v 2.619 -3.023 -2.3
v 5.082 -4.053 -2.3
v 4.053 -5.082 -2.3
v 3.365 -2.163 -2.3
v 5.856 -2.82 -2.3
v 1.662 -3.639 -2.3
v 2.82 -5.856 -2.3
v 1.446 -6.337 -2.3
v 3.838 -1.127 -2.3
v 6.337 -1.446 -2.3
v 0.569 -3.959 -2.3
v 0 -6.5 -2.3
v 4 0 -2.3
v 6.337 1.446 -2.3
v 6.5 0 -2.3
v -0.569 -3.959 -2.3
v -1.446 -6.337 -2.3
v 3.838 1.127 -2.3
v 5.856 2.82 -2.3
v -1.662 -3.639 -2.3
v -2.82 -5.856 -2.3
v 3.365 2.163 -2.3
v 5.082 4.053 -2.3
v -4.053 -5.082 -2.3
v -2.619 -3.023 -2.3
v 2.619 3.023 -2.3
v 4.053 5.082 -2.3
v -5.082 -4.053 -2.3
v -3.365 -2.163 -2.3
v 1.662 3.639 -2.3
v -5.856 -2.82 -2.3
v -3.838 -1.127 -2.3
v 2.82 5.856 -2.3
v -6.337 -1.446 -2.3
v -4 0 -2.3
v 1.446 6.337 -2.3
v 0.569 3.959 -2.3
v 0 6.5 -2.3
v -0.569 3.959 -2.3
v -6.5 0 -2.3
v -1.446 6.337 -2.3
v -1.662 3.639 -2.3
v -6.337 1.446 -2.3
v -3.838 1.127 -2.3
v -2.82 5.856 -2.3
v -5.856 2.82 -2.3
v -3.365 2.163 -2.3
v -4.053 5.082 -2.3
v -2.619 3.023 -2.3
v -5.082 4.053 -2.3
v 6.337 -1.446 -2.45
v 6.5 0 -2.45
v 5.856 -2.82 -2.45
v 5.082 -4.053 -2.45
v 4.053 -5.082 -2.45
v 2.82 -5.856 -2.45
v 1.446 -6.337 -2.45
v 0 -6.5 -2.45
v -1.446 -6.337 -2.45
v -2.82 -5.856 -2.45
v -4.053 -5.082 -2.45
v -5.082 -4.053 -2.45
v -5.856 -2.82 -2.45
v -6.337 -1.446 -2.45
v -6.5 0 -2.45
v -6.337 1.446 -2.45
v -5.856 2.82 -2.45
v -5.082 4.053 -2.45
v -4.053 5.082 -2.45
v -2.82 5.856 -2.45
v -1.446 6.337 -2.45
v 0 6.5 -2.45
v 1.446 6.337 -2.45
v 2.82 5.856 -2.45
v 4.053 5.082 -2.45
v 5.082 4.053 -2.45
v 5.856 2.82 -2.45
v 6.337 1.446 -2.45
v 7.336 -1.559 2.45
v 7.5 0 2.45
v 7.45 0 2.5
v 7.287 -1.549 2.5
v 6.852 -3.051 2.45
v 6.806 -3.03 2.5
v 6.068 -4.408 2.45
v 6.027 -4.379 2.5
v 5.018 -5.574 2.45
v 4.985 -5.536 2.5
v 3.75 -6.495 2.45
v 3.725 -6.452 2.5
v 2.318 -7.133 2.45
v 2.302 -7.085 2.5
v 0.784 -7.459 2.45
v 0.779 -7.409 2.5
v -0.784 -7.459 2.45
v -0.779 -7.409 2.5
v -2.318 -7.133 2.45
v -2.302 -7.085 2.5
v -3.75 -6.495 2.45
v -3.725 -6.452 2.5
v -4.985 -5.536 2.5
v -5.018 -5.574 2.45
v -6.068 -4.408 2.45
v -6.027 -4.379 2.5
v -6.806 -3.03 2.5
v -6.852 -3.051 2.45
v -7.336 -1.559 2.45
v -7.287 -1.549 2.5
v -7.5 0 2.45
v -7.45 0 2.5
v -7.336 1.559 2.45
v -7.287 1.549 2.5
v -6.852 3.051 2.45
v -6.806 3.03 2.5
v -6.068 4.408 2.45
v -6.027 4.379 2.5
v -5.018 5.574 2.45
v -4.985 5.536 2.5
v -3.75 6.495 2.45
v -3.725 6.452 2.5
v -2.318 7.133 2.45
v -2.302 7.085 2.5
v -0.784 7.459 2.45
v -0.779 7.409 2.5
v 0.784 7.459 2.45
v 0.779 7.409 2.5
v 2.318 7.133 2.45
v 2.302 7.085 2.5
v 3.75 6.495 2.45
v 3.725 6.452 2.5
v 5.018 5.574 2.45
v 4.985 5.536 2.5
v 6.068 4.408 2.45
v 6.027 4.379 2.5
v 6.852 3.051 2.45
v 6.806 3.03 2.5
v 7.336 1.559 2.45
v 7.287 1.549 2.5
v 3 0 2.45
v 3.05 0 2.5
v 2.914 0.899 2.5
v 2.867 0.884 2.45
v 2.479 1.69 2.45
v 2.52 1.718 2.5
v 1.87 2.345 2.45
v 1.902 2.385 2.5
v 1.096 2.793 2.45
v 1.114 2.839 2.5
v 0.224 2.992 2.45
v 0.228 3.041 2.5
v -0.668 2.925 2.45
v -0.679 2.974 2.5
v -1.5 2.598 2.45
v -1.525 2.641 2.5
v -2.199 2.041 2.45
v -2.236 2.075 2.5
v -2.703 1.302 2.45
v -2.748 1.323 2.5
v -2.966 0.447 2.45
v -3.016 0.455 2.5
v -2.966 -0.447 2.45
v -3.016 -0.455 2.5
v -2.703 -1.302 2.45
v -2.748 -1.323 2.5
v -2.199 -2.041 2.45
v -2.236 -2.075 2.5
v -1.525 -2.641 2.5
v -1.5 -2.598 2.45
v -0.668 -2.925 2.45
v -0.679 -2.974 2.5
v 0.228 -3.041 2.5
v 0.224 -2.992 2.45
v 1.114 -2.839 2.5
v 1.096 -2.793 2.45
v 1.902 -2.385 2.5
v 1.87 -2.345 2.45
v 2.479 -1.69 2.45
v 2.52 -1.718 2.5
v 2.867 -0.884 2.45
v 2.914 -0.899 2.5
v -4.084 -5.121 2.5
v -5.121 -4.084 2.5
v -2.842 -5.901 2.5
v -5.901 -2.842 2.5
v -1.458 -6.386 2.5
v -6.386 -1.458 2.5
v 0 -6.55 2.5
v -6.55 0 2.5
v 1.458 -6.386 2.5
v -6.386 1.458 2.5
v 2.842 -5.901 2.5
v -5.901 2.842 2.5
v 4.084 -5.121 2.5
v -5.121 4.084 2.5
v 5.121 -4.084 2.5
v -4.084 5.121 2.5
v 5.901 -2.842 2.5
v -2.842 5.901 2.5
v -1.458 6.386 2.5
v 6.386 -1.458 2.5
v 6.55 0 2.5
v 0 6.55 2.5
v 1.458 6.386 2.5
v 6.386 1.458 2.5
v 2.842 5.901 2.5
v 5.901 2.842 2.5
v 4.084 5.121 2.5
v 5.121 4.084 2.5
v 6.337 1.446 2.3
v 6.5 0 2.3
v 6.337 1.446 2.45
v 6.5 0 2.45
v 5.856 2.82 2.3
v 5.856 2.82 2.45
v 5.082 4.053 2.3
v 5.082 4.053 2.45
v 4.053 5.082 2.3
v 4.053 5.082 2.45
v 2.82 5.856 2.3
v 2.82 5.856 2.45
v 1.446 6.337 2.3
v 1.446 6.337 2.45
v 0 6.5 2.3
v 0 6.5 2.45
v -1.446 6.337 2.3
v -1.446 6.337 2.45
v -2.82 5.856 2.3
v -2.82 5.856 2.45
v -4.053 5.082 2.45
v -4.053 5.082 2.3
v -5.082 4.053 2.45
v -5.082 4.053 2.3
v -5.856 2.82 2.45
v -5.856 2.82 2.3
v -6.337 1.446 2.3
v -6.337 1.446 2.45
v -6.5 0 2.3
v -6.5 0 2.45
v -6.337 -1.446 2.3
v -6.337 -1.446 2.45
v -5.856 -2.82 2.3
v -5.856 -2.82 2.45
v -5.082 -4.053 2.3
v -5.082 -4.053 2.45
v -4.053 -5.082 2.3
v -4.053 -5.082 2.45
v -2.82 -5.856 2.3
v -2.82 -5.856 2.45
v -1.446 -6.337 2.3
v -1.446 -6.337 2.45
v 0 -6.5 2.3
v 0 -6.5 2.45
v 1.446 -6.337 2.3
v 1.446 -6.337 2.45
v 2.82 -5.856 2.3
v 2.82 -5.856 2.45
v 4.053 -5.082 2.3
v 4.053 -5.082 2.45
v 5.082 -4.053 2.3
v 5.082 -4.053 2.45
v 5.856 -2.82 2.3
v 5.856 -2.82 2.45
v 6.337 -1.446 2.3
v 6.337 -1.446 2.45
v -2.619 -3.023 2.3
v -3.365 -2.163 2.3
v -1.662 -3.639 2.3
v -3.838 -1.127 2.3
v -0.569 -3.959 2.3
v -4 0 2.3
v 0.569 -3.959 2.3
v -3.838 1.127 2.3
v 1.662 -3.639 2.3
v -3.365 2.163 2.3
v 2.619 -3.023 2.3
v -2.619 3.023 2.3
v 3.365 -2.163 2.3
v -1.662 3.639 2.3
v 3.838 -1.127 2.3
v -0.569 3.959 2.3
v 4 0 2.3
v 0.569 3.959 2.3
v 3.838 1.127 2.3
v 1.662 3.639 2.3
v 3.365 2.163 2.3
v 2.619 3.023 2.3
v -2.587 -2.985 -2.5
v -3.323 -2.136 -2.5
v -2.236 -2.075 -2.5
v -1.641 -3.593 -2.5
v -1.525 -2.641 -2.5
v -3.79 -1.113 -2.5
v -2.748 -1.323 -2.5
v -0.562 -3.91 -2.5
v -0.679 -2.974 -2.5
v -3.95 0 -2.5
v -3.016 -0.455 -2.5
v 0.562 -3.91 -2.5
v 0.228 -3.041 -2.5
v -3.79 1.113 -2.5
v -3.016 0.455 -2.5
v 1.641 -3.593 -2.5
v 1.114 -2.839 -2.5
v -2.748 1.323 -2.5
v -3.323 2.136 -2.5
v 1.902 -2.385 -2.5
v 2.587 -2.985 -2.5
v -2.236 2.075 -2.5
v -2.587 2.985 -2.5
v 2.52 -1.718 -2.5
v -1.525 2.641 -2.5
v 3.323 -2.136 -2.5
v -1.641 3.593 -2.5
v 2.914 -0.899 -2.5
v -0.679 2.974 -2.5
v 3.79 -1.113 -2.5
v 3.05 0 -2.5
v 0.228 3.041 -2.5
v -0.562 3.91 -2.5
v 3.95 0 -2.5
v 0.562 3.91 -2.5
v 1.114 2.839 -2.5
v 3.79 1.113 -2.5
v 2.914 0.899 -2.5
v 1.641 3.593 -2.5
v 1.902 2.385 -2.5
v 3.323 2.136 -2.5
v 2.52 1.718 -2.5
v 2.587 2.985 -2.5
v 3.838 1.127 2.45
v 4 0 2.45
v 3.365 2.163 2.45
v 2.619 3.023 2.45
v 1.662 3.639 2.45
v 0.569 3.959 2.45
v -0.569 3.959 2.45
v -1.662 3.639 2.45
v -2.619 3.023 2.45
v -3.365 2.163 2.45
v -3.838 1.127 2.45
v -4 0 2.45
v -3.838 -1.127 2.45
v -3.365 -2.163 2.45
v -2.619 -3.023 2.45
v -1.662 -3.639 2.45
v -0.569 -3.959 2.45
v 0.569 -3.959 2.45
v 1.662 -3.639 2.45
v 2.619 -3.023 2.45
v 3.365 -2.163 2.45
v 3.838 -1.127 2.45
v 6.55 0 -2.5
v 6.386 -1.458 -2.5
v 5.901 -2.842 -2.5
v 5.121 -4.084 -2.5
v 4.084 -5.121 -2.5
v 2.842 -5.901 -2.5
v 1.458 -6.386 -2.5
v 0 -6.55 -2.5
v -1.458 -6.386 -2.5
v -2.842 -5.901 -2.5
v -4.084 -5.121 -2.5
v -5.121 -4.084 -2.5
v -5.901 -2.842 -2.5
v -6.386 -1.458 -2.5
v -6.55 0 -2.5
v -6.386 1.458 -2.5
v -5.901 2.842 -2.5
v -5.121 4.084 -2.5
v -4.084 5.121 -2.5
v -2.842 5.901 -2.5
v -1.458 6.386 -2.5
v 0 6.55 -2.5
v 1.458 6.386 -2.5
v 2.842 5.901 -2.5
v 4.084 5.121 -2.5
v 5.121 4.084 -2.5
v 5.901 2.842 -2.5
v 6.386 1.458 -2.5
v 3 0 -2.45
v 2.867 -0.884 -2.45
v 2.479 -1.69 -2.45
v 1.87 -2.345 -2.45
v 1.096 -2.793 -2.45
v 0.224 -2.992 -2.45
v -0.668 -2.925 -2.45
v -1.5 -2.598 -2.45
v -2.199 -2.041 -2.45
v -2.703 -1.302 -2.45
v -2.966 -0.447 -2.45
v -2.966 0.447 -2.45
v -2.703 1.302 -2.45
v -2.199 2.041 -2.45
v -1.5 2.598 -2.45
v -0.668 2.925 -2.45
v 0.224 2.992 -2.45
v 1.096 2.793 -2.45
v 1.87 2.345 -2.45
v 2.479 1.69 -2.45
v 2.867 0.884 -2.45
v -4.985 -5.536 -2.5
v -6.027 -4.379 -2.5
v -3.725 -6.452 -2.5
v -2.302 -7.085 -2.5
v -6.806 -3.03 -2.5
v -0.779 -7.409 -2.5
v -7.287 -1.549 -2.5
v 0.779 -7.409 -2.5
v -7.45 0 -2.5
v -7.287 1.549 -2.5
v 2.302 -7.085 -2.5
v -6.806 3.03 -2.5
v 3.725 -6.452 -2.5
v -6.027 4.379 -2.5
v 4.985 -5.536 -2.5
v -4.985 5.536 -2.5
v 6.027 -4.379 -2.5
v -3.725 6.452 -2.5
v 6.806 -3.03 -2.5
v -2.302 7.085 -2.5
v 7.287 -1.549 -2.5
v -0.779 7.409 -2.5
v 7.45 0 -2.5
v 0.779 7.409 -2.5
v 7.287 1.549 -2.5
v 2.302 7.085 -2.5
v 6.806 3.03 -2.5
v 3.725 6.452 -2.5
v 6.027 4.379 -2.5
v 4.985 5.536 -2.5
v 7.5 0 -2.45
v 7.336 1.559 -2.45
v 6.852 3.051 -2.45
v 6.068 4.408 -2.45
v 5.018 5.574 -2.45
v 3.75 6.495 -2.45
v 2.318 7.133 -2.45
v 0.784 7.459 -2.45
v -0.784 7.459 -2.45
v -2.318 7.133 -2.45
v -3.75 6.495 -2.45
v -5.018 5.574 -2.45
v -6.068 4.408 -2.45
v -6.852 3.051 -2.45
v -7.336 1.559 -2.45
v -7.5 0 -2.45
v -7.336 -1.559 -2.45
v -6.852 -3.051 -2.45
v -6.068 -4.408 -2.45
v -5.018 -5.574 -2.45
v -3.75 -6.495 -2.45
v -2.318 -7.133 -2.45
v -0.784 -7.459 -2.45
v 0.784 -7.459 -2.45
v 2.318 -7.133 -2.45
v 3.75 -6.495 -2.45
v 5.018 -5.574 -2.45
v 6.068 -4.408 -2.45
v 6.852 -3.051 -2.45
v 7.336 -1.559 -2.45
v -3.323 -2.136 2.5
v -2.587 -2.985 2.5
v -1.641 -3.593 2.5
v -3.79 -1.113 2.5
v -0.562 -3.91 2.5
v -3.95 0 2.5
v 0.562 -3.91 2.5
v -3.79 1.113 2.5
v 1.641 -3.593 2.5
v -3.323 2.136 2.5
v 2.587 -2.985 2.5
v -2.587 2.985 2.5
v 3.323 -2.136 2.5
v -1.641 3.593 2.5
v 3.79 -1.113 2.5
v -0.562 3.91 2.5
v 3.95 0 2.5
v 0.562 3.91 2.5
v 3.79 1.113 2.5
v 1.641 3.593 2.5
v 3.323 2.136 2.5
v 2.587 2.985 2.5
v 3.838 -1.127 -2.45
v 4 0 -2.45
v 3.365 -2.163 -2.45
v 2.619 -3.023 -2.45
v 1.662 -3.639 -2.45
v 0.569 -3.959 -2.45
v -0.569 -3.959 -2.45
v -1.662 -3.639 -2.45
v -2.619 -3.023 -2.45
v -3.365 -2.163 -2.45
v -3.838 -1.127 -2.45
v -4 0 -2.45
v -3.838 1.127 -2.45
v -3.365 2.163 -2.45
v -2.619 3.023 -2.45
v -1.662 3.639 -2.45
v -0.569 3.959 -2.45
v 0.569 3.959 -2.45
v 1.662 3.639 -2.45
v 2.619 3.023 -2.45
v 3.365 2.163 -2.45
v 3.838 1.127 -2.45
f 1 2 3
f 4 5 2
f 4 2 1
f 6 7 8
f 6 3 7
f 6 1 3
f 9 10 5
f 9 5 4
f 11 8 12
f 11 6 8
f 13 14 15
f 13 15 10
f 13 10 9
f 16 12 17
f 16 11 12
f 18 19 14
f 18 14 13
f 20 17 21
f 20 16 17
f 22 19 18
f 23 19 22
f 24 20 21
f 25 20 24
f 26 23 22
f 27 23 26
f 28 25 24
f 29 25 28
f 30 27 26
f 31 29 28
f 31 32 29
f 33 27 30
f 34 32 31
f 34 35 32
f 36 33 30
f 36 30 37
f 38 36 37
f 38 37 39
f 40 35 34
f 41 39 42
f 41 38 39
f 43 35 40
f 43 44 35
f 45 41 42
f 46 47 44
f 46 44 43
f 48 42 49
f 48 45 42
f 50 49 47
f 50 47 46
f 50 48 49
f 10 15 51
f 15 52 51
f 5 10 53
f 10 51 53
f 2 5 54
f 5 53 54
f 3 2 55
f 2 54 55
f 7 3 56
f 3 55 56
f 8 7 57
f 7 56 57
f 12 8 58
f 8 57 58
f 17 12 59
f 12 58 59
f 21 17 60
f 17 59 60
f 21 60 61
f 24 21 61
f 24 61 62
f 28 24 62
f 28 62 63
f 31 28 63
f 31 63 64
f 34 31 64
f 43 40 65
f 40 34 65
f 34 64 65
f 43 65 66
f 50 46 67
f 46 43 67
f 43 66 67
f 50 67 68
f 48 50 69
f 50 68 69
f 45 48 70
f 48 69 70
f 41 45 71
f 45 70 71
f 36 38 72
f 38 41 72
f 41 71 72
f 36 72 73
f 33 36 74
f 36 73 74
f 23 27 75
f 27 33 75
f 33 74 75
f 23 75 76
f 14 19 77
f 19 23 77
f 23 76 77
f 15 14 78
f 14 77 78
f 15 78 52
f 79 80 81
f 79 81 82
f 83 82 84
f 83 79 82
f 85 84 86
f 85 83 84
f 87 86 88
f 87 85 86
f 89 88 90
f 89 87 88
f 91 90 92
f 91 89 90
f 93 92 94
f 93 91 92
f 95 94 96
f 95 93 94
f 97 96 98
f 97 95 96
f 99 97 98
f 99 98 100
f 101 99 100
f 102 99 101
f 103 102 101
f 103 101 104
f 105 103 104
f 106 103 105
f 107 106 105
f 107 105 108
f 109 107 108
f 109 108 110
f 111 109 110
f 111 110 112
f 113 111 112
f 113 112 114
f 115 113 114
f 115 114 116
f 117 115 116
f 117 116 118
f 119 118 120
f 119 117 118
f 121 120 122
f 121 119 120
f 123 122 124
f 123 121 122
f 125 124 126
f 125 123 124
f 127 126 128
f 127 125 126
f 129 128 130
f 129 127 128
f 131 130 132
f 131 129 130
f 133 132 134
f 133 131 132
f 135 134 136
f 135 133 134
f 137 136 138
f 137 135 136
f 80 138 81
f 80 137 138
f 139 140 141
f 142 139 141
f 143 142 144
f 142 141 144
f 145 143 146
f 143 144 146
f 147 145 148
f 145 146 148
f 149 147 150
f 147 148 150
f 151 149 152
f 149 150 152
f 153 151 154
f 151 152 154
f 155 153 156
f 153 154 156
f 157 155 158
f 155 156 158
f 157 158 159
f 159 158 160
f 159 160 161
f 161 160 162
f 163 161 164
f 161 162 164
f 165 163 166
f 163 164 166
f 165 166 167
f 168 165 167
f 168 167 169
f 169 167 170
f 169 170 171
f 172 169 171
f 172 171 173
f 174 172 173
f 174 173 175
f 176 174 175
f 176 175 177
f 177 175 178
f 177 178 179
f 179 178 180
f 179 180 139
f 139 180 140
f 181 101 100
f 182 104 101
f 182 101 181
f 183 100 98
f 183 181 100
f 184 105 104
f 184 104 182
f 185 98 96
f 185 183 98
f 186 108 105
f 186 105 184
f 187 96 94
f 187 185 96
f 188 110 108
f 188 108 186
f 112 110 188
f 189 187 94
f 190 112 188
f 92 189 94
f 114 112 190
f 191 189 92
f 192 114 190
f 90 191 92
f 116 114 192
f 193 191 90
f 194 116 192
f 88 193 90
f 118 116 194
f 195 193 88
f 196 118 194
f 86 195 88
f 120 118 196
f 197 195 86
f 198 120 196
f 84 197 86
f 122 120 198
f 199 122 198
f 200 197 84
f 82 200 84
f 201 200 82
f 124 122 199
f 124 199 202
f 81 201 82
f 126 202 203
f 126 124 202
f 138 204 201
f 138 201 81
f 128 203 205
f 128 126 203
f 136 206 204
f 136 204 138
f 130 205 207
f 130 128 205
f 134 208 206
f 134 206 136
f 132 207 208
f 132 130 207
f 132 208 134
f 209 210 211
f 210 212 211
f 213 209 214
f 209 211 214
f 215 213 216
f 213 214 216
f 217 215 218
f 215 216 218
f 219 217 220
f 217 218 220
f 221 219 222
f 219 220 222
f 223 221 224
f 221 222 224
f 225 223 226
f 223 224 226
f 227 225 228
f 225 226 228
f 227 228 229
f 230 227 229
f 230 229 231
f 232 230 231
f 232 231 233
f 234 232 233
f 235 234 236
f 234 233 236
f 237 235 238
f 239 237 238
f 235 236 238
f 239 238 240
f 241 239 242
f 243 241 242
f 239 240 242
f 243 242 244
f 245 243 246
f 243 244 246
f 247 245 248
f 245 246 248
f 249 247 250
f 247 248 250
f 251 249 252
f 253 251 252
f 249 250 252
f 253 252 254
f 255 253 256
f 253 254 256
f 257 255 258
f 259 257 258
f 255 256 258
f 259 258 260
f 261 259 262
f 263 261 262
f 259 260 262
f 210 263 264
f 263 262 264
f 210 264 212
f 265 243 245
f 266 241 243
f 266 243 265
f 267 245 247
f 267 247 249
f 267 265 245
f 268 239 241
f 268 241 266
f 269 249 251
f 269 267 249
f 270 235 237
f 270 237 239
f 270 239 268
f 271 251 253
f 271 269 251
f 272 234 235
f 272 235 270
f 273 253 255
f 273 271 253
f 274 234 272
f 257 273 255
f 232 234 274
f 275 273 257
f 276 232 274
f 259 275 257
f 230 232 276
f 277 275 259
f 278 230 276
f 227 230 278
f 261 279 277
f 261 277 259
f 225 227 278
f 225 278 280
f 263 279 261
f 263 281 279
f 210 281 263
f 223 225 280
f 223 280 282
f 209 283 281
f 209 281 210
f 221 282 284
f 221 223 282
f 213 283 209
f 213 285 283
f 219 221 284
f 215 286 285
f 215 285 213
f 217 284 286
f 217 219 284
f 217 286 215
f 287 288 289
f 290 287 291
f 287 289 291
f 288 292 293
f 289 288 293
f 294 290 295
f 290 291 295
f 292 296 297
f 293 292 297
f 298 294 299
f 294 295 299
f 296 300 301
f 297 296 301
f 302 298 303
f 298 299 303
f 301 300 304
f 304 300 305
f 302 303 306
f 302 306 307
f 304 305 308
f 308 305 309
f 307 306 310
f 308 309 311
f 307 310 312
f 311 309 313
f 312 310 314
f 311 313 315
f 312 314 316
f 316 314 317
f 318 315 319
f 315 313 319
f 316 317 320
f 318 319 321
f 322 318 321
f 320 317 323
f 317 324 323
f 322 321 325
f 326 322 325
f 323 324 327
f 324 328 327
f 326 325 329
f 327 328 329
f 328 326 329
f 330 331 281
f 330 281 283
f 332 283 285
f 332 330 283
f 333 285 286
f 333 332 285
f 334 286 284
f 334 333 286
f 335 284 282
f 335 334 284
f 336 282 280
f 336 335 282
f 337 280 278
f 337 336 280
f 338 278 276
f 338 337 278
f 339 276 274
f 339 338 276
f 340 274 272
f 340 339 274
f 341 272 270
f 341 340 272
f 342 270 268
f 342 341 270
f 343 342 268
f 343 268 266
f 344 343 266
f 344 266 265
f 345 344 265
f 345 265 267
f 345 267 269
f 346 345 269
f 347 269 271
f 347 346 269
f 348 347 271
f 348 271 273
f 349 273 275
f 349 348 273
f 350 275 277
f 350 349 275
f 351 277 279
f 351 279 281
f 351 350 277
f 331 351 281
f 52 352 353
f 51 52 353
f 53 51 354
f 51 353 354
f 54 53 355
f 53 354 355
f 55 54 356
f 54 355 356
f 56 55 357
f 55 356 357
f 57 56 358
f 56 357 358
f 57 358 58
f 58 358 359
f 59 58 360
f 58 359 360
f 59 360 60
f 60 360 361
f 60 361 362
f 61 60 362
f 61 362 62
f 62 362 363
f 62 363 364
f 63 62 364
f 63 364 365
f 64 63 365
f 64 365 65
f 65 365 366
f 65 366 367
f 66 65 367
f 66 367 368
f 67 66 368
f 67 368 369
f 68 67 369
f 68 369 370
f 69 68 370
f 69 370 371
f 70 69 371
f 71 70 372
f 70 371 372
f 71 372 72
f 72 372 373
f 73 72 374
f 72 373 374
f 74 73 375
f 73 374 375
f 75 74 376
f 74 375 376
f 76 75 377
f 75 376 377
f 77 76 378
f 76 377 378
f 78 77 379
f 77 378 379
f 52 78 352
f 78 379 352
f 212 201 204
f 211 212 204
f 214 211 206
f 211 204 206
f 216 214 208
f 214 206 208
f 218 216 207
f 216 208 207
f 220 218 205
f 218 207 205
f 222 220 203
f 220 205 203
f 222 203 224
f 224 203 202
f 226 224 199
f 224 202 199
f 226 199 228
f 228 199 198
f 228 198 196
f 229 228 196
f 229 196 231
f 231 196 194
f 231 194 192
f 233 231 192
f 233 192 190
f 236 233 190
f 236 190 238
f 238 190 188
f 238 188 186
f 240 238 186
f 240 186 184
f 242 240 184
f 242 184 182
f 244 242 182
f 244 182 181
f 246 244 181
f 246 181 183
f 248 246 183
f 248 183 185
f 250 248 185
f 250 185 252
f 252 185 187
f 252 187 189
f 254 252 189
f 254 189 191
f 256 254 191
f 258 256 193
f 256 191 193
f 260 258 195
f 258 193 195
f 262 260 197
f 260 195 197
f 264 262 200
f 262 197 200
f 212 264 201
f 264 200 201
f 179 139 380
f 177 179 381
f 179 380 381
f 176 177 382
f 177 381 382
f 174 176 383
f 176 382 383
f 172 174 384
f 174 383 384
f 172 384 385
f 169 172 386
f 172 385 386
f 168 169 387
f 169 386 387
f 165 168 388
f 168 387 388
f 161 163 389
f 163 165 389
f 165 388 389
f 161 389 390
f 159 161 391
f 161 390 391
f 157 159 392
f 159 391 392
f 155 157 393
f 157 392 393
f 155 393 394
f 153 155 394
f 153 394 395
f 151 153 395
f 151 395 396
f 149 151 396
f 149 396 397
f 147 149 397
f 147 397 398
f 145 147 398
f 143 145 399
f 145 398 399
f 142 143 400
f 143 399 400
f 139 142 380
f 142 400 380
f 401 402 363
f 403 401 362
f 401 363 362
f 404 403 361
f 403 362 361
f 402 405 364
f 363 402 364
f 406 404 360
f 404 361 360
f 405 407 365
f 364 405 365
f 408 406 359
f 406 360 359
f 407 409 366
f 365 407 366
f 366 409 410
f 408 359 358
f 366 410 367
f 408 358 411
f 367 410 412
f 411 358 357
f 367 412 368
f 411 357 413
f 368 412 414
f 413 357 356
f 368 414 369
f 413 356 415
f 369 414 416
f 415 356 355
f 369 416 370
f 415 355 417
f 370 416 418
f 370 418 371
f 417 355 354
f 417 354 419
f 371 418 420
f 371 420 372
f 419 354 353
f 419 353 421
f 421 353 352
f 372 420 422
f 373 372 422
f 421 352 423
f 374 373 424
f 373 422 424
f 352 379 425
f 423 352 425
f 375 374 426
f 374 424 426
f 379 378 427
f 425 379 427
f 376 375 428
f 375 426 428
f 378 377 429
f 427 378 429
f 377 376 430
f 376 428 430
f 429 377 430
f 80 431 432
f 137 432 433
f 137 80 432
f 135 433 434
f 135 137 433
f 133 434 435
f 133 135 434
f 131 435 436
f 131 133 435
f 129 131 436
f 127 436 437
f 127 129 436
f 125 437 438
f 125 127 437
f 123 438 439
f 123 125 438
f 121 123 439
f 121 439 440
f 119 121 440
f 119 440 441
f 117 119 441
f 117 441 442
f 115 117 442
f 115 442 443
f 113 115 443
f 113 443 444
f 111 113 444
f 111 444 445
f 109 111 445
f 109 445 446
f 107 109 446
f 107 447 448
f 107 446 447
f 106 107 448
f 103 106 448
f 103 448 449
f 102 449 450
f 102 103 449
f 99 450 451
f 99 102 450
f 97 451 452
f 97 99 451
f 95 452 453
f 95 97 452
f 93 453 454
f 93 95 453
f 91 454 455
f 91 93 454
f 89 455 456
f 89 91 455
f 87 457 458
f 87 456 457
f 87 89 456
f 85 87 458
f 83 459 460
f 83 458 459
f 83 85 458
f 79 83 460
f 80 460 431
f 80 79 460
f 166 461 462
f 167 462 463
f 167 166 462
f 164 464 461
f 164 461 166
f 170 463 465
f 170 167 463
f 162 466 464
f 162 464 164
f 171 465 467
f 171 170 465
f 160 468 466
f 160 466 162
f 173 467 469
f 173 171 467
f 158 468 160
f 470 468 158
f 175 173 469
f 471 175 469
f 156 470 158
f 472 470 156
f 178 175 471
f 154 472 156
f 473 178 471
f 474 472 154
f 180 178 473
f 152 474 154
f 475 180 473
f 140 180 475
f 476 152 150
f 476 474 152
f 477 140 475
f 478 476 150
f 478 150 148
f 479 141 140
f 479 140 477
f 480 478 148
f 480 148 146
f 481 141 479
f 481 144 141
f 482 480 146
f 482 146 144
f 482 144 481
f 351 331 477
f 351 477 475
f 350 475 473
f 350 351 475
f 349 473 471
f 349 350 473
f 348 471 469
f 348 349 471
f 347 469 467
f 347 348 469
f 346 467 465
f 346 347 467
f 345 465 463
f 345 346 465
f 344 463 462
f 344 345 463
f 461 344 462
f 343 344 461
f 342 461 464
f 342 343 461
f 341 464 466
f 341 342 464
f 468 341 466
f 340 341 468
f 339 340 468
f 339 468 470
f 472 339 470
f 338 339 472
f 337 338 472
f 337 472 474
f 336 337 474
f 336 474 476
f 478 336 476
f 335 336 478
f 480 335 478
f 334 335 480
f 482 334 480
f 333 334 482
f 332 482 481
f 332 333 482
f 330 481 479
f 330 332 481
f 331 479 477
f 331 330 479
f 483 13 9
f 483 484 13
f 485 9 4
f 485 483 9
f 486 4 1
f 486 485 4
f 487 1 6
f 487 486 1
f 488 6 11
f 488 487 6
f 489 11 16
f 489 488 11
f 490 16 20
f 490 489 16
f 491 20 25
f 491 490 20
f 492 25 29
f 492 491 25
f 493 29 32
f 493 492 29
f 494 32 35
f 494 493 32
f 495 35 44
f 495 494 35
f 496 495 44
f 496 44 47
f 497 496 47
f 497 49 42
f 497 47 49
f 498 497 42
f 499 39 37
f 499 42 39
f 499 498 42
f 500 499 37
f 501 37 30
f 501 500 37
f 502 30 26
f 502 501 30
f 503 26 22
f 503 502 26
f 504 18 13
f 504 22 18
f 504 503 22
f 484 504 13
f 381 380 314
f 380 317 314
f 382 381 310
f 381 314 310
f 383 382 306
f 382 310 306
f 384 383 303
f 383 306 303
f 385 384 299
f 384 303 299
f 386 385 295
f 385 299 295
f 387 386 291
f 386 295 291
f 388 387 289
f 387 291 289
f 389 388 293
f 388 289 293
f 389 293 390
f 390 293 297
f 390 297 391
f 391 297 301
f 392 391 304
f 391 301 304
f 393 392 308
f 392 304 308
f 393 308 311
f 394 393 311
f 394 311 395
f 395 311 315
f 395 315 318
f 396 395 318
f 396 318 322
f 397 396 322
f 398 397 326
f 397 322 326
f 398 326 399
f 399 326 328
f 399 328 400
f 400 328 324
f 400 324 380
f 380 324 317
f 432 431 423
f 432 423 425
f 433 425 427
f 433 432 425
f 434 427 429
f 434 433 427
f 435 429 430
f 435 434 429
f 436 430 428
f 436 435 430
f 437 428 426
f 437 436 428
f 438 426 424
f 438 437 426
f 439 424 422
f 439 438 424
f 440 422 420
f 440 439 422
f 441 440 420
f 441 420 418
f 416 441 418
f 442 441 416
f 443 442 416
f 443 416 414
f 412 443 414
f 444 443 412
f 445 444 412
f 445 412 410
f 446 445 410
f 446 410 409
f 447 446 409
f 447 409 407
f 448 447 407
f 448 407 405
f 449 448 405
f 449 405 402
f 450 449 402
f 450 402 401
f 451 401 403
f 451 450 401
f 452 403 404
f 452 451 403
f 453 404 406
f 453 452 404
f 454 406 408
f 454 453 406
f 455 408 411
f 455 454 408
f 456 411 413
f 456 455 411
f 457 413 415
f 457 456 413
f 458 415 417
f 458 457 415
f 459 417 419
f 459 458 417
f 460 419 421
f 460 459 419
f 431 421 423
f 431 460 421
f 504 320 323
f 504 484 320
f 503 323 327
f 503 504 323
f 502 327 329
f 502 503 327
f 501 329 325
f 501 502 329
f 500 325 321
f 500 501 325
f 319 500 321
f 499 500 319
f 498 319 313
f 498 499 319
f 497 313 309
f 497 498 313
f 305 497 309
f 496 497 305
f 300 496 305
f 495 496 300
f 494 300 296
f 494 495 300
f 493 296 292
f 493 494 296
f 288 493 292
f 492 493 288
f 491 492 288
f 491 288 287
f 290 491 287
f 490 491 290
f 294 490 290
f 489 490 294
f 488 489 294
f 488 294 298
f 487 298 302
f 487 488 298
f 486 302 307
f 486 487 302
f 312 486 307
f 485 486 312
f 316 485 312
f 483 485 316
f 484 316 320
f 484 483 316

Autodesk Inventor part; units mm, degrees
ref_plane "YZ Plane" through (0, 0, 0) normal (1, 0, 0) x (0, 1, 0)
ref_plane "XZ Plane" through (0, 0, 0) normal (0, 1, 0) x (-1, 0, 0)
ref_plane "XY Plane" through (0, 0, 0) normal (0, 0, 1) x (1, 0, 0)
sketch "Skizze1" plane through (0, 0, 0) normal (0, 0, 1) x (1, 0, 0)
  line L0 (-10.5, 0) -> (10.5, 0) projected
  line L1 (0, -10.5) -> (0, 10.5) projected
  circle A0 centre (0, 0) radius 7.5
  circle A1 centre (0, 0) radius 3
  dimension "d0" = 15
  dimension "d1" = 6
extrude "Extrusion1" add sketch "Skizze1" along normal mid plane 5 contours A1 L1 A0 L0 | L0 A0 L1 A1 | A1 L0 A0 L1 | L1 A0 L0 A1
sketch "Skizze2" plane through (0, 0, 2.5) normal (0, 0, 1) x (1, 0, 0)
  circle A0 centre (0, 0) radius 3 projected
  circle A1 centre (0, 0) radius 7.5 projected
  circle A2 centre (0, 0) radius 4
  circle A3 centre (0, 0) radius 6.5
  dimension "d4" = 8
  dimension "d5" = 13
extrude "Extrusion2" cut sketch "Skizze2" against normal blind 0.2 contours A3
mirror "Spiegeln1" about plane through (0, 0, 0) normal (0, 0, 1) of "Extrusion2"
chamfer "Fase1" distance 0.05 angle 45 1 edges at (-6.5, 0, 2.5)
chamfer "Fase2" distance 0.05 angle 45 1 edges at (-4, 0, 2.5)
chamfer "Fase3" distance 0.05 angle 45 1 edges at (-3, 0, 2.5)
chamfer "Fase4" distance 0.05 angle 45 1 edges at (-7.5, 0, 2.5)
chamfer "Fase5" distance 0.05 angle 45 1 edges at (-7.5, 0, -2.5)
chamfer "Fase6" distance 0.05 angle 45 1 edges at (-6.5, 0, -2.5)
chamfer "Fase7" distance 0.05 angle 45 1 edges at (-4, 0, -2.5)
chamfer "Fase8" distance 0.05 angle 45 1 edges at (-3, 0, -2.5)
properties part number "Kugellager_6x15x5_696ZZ" material "Stahl, Kohlenstoff"
